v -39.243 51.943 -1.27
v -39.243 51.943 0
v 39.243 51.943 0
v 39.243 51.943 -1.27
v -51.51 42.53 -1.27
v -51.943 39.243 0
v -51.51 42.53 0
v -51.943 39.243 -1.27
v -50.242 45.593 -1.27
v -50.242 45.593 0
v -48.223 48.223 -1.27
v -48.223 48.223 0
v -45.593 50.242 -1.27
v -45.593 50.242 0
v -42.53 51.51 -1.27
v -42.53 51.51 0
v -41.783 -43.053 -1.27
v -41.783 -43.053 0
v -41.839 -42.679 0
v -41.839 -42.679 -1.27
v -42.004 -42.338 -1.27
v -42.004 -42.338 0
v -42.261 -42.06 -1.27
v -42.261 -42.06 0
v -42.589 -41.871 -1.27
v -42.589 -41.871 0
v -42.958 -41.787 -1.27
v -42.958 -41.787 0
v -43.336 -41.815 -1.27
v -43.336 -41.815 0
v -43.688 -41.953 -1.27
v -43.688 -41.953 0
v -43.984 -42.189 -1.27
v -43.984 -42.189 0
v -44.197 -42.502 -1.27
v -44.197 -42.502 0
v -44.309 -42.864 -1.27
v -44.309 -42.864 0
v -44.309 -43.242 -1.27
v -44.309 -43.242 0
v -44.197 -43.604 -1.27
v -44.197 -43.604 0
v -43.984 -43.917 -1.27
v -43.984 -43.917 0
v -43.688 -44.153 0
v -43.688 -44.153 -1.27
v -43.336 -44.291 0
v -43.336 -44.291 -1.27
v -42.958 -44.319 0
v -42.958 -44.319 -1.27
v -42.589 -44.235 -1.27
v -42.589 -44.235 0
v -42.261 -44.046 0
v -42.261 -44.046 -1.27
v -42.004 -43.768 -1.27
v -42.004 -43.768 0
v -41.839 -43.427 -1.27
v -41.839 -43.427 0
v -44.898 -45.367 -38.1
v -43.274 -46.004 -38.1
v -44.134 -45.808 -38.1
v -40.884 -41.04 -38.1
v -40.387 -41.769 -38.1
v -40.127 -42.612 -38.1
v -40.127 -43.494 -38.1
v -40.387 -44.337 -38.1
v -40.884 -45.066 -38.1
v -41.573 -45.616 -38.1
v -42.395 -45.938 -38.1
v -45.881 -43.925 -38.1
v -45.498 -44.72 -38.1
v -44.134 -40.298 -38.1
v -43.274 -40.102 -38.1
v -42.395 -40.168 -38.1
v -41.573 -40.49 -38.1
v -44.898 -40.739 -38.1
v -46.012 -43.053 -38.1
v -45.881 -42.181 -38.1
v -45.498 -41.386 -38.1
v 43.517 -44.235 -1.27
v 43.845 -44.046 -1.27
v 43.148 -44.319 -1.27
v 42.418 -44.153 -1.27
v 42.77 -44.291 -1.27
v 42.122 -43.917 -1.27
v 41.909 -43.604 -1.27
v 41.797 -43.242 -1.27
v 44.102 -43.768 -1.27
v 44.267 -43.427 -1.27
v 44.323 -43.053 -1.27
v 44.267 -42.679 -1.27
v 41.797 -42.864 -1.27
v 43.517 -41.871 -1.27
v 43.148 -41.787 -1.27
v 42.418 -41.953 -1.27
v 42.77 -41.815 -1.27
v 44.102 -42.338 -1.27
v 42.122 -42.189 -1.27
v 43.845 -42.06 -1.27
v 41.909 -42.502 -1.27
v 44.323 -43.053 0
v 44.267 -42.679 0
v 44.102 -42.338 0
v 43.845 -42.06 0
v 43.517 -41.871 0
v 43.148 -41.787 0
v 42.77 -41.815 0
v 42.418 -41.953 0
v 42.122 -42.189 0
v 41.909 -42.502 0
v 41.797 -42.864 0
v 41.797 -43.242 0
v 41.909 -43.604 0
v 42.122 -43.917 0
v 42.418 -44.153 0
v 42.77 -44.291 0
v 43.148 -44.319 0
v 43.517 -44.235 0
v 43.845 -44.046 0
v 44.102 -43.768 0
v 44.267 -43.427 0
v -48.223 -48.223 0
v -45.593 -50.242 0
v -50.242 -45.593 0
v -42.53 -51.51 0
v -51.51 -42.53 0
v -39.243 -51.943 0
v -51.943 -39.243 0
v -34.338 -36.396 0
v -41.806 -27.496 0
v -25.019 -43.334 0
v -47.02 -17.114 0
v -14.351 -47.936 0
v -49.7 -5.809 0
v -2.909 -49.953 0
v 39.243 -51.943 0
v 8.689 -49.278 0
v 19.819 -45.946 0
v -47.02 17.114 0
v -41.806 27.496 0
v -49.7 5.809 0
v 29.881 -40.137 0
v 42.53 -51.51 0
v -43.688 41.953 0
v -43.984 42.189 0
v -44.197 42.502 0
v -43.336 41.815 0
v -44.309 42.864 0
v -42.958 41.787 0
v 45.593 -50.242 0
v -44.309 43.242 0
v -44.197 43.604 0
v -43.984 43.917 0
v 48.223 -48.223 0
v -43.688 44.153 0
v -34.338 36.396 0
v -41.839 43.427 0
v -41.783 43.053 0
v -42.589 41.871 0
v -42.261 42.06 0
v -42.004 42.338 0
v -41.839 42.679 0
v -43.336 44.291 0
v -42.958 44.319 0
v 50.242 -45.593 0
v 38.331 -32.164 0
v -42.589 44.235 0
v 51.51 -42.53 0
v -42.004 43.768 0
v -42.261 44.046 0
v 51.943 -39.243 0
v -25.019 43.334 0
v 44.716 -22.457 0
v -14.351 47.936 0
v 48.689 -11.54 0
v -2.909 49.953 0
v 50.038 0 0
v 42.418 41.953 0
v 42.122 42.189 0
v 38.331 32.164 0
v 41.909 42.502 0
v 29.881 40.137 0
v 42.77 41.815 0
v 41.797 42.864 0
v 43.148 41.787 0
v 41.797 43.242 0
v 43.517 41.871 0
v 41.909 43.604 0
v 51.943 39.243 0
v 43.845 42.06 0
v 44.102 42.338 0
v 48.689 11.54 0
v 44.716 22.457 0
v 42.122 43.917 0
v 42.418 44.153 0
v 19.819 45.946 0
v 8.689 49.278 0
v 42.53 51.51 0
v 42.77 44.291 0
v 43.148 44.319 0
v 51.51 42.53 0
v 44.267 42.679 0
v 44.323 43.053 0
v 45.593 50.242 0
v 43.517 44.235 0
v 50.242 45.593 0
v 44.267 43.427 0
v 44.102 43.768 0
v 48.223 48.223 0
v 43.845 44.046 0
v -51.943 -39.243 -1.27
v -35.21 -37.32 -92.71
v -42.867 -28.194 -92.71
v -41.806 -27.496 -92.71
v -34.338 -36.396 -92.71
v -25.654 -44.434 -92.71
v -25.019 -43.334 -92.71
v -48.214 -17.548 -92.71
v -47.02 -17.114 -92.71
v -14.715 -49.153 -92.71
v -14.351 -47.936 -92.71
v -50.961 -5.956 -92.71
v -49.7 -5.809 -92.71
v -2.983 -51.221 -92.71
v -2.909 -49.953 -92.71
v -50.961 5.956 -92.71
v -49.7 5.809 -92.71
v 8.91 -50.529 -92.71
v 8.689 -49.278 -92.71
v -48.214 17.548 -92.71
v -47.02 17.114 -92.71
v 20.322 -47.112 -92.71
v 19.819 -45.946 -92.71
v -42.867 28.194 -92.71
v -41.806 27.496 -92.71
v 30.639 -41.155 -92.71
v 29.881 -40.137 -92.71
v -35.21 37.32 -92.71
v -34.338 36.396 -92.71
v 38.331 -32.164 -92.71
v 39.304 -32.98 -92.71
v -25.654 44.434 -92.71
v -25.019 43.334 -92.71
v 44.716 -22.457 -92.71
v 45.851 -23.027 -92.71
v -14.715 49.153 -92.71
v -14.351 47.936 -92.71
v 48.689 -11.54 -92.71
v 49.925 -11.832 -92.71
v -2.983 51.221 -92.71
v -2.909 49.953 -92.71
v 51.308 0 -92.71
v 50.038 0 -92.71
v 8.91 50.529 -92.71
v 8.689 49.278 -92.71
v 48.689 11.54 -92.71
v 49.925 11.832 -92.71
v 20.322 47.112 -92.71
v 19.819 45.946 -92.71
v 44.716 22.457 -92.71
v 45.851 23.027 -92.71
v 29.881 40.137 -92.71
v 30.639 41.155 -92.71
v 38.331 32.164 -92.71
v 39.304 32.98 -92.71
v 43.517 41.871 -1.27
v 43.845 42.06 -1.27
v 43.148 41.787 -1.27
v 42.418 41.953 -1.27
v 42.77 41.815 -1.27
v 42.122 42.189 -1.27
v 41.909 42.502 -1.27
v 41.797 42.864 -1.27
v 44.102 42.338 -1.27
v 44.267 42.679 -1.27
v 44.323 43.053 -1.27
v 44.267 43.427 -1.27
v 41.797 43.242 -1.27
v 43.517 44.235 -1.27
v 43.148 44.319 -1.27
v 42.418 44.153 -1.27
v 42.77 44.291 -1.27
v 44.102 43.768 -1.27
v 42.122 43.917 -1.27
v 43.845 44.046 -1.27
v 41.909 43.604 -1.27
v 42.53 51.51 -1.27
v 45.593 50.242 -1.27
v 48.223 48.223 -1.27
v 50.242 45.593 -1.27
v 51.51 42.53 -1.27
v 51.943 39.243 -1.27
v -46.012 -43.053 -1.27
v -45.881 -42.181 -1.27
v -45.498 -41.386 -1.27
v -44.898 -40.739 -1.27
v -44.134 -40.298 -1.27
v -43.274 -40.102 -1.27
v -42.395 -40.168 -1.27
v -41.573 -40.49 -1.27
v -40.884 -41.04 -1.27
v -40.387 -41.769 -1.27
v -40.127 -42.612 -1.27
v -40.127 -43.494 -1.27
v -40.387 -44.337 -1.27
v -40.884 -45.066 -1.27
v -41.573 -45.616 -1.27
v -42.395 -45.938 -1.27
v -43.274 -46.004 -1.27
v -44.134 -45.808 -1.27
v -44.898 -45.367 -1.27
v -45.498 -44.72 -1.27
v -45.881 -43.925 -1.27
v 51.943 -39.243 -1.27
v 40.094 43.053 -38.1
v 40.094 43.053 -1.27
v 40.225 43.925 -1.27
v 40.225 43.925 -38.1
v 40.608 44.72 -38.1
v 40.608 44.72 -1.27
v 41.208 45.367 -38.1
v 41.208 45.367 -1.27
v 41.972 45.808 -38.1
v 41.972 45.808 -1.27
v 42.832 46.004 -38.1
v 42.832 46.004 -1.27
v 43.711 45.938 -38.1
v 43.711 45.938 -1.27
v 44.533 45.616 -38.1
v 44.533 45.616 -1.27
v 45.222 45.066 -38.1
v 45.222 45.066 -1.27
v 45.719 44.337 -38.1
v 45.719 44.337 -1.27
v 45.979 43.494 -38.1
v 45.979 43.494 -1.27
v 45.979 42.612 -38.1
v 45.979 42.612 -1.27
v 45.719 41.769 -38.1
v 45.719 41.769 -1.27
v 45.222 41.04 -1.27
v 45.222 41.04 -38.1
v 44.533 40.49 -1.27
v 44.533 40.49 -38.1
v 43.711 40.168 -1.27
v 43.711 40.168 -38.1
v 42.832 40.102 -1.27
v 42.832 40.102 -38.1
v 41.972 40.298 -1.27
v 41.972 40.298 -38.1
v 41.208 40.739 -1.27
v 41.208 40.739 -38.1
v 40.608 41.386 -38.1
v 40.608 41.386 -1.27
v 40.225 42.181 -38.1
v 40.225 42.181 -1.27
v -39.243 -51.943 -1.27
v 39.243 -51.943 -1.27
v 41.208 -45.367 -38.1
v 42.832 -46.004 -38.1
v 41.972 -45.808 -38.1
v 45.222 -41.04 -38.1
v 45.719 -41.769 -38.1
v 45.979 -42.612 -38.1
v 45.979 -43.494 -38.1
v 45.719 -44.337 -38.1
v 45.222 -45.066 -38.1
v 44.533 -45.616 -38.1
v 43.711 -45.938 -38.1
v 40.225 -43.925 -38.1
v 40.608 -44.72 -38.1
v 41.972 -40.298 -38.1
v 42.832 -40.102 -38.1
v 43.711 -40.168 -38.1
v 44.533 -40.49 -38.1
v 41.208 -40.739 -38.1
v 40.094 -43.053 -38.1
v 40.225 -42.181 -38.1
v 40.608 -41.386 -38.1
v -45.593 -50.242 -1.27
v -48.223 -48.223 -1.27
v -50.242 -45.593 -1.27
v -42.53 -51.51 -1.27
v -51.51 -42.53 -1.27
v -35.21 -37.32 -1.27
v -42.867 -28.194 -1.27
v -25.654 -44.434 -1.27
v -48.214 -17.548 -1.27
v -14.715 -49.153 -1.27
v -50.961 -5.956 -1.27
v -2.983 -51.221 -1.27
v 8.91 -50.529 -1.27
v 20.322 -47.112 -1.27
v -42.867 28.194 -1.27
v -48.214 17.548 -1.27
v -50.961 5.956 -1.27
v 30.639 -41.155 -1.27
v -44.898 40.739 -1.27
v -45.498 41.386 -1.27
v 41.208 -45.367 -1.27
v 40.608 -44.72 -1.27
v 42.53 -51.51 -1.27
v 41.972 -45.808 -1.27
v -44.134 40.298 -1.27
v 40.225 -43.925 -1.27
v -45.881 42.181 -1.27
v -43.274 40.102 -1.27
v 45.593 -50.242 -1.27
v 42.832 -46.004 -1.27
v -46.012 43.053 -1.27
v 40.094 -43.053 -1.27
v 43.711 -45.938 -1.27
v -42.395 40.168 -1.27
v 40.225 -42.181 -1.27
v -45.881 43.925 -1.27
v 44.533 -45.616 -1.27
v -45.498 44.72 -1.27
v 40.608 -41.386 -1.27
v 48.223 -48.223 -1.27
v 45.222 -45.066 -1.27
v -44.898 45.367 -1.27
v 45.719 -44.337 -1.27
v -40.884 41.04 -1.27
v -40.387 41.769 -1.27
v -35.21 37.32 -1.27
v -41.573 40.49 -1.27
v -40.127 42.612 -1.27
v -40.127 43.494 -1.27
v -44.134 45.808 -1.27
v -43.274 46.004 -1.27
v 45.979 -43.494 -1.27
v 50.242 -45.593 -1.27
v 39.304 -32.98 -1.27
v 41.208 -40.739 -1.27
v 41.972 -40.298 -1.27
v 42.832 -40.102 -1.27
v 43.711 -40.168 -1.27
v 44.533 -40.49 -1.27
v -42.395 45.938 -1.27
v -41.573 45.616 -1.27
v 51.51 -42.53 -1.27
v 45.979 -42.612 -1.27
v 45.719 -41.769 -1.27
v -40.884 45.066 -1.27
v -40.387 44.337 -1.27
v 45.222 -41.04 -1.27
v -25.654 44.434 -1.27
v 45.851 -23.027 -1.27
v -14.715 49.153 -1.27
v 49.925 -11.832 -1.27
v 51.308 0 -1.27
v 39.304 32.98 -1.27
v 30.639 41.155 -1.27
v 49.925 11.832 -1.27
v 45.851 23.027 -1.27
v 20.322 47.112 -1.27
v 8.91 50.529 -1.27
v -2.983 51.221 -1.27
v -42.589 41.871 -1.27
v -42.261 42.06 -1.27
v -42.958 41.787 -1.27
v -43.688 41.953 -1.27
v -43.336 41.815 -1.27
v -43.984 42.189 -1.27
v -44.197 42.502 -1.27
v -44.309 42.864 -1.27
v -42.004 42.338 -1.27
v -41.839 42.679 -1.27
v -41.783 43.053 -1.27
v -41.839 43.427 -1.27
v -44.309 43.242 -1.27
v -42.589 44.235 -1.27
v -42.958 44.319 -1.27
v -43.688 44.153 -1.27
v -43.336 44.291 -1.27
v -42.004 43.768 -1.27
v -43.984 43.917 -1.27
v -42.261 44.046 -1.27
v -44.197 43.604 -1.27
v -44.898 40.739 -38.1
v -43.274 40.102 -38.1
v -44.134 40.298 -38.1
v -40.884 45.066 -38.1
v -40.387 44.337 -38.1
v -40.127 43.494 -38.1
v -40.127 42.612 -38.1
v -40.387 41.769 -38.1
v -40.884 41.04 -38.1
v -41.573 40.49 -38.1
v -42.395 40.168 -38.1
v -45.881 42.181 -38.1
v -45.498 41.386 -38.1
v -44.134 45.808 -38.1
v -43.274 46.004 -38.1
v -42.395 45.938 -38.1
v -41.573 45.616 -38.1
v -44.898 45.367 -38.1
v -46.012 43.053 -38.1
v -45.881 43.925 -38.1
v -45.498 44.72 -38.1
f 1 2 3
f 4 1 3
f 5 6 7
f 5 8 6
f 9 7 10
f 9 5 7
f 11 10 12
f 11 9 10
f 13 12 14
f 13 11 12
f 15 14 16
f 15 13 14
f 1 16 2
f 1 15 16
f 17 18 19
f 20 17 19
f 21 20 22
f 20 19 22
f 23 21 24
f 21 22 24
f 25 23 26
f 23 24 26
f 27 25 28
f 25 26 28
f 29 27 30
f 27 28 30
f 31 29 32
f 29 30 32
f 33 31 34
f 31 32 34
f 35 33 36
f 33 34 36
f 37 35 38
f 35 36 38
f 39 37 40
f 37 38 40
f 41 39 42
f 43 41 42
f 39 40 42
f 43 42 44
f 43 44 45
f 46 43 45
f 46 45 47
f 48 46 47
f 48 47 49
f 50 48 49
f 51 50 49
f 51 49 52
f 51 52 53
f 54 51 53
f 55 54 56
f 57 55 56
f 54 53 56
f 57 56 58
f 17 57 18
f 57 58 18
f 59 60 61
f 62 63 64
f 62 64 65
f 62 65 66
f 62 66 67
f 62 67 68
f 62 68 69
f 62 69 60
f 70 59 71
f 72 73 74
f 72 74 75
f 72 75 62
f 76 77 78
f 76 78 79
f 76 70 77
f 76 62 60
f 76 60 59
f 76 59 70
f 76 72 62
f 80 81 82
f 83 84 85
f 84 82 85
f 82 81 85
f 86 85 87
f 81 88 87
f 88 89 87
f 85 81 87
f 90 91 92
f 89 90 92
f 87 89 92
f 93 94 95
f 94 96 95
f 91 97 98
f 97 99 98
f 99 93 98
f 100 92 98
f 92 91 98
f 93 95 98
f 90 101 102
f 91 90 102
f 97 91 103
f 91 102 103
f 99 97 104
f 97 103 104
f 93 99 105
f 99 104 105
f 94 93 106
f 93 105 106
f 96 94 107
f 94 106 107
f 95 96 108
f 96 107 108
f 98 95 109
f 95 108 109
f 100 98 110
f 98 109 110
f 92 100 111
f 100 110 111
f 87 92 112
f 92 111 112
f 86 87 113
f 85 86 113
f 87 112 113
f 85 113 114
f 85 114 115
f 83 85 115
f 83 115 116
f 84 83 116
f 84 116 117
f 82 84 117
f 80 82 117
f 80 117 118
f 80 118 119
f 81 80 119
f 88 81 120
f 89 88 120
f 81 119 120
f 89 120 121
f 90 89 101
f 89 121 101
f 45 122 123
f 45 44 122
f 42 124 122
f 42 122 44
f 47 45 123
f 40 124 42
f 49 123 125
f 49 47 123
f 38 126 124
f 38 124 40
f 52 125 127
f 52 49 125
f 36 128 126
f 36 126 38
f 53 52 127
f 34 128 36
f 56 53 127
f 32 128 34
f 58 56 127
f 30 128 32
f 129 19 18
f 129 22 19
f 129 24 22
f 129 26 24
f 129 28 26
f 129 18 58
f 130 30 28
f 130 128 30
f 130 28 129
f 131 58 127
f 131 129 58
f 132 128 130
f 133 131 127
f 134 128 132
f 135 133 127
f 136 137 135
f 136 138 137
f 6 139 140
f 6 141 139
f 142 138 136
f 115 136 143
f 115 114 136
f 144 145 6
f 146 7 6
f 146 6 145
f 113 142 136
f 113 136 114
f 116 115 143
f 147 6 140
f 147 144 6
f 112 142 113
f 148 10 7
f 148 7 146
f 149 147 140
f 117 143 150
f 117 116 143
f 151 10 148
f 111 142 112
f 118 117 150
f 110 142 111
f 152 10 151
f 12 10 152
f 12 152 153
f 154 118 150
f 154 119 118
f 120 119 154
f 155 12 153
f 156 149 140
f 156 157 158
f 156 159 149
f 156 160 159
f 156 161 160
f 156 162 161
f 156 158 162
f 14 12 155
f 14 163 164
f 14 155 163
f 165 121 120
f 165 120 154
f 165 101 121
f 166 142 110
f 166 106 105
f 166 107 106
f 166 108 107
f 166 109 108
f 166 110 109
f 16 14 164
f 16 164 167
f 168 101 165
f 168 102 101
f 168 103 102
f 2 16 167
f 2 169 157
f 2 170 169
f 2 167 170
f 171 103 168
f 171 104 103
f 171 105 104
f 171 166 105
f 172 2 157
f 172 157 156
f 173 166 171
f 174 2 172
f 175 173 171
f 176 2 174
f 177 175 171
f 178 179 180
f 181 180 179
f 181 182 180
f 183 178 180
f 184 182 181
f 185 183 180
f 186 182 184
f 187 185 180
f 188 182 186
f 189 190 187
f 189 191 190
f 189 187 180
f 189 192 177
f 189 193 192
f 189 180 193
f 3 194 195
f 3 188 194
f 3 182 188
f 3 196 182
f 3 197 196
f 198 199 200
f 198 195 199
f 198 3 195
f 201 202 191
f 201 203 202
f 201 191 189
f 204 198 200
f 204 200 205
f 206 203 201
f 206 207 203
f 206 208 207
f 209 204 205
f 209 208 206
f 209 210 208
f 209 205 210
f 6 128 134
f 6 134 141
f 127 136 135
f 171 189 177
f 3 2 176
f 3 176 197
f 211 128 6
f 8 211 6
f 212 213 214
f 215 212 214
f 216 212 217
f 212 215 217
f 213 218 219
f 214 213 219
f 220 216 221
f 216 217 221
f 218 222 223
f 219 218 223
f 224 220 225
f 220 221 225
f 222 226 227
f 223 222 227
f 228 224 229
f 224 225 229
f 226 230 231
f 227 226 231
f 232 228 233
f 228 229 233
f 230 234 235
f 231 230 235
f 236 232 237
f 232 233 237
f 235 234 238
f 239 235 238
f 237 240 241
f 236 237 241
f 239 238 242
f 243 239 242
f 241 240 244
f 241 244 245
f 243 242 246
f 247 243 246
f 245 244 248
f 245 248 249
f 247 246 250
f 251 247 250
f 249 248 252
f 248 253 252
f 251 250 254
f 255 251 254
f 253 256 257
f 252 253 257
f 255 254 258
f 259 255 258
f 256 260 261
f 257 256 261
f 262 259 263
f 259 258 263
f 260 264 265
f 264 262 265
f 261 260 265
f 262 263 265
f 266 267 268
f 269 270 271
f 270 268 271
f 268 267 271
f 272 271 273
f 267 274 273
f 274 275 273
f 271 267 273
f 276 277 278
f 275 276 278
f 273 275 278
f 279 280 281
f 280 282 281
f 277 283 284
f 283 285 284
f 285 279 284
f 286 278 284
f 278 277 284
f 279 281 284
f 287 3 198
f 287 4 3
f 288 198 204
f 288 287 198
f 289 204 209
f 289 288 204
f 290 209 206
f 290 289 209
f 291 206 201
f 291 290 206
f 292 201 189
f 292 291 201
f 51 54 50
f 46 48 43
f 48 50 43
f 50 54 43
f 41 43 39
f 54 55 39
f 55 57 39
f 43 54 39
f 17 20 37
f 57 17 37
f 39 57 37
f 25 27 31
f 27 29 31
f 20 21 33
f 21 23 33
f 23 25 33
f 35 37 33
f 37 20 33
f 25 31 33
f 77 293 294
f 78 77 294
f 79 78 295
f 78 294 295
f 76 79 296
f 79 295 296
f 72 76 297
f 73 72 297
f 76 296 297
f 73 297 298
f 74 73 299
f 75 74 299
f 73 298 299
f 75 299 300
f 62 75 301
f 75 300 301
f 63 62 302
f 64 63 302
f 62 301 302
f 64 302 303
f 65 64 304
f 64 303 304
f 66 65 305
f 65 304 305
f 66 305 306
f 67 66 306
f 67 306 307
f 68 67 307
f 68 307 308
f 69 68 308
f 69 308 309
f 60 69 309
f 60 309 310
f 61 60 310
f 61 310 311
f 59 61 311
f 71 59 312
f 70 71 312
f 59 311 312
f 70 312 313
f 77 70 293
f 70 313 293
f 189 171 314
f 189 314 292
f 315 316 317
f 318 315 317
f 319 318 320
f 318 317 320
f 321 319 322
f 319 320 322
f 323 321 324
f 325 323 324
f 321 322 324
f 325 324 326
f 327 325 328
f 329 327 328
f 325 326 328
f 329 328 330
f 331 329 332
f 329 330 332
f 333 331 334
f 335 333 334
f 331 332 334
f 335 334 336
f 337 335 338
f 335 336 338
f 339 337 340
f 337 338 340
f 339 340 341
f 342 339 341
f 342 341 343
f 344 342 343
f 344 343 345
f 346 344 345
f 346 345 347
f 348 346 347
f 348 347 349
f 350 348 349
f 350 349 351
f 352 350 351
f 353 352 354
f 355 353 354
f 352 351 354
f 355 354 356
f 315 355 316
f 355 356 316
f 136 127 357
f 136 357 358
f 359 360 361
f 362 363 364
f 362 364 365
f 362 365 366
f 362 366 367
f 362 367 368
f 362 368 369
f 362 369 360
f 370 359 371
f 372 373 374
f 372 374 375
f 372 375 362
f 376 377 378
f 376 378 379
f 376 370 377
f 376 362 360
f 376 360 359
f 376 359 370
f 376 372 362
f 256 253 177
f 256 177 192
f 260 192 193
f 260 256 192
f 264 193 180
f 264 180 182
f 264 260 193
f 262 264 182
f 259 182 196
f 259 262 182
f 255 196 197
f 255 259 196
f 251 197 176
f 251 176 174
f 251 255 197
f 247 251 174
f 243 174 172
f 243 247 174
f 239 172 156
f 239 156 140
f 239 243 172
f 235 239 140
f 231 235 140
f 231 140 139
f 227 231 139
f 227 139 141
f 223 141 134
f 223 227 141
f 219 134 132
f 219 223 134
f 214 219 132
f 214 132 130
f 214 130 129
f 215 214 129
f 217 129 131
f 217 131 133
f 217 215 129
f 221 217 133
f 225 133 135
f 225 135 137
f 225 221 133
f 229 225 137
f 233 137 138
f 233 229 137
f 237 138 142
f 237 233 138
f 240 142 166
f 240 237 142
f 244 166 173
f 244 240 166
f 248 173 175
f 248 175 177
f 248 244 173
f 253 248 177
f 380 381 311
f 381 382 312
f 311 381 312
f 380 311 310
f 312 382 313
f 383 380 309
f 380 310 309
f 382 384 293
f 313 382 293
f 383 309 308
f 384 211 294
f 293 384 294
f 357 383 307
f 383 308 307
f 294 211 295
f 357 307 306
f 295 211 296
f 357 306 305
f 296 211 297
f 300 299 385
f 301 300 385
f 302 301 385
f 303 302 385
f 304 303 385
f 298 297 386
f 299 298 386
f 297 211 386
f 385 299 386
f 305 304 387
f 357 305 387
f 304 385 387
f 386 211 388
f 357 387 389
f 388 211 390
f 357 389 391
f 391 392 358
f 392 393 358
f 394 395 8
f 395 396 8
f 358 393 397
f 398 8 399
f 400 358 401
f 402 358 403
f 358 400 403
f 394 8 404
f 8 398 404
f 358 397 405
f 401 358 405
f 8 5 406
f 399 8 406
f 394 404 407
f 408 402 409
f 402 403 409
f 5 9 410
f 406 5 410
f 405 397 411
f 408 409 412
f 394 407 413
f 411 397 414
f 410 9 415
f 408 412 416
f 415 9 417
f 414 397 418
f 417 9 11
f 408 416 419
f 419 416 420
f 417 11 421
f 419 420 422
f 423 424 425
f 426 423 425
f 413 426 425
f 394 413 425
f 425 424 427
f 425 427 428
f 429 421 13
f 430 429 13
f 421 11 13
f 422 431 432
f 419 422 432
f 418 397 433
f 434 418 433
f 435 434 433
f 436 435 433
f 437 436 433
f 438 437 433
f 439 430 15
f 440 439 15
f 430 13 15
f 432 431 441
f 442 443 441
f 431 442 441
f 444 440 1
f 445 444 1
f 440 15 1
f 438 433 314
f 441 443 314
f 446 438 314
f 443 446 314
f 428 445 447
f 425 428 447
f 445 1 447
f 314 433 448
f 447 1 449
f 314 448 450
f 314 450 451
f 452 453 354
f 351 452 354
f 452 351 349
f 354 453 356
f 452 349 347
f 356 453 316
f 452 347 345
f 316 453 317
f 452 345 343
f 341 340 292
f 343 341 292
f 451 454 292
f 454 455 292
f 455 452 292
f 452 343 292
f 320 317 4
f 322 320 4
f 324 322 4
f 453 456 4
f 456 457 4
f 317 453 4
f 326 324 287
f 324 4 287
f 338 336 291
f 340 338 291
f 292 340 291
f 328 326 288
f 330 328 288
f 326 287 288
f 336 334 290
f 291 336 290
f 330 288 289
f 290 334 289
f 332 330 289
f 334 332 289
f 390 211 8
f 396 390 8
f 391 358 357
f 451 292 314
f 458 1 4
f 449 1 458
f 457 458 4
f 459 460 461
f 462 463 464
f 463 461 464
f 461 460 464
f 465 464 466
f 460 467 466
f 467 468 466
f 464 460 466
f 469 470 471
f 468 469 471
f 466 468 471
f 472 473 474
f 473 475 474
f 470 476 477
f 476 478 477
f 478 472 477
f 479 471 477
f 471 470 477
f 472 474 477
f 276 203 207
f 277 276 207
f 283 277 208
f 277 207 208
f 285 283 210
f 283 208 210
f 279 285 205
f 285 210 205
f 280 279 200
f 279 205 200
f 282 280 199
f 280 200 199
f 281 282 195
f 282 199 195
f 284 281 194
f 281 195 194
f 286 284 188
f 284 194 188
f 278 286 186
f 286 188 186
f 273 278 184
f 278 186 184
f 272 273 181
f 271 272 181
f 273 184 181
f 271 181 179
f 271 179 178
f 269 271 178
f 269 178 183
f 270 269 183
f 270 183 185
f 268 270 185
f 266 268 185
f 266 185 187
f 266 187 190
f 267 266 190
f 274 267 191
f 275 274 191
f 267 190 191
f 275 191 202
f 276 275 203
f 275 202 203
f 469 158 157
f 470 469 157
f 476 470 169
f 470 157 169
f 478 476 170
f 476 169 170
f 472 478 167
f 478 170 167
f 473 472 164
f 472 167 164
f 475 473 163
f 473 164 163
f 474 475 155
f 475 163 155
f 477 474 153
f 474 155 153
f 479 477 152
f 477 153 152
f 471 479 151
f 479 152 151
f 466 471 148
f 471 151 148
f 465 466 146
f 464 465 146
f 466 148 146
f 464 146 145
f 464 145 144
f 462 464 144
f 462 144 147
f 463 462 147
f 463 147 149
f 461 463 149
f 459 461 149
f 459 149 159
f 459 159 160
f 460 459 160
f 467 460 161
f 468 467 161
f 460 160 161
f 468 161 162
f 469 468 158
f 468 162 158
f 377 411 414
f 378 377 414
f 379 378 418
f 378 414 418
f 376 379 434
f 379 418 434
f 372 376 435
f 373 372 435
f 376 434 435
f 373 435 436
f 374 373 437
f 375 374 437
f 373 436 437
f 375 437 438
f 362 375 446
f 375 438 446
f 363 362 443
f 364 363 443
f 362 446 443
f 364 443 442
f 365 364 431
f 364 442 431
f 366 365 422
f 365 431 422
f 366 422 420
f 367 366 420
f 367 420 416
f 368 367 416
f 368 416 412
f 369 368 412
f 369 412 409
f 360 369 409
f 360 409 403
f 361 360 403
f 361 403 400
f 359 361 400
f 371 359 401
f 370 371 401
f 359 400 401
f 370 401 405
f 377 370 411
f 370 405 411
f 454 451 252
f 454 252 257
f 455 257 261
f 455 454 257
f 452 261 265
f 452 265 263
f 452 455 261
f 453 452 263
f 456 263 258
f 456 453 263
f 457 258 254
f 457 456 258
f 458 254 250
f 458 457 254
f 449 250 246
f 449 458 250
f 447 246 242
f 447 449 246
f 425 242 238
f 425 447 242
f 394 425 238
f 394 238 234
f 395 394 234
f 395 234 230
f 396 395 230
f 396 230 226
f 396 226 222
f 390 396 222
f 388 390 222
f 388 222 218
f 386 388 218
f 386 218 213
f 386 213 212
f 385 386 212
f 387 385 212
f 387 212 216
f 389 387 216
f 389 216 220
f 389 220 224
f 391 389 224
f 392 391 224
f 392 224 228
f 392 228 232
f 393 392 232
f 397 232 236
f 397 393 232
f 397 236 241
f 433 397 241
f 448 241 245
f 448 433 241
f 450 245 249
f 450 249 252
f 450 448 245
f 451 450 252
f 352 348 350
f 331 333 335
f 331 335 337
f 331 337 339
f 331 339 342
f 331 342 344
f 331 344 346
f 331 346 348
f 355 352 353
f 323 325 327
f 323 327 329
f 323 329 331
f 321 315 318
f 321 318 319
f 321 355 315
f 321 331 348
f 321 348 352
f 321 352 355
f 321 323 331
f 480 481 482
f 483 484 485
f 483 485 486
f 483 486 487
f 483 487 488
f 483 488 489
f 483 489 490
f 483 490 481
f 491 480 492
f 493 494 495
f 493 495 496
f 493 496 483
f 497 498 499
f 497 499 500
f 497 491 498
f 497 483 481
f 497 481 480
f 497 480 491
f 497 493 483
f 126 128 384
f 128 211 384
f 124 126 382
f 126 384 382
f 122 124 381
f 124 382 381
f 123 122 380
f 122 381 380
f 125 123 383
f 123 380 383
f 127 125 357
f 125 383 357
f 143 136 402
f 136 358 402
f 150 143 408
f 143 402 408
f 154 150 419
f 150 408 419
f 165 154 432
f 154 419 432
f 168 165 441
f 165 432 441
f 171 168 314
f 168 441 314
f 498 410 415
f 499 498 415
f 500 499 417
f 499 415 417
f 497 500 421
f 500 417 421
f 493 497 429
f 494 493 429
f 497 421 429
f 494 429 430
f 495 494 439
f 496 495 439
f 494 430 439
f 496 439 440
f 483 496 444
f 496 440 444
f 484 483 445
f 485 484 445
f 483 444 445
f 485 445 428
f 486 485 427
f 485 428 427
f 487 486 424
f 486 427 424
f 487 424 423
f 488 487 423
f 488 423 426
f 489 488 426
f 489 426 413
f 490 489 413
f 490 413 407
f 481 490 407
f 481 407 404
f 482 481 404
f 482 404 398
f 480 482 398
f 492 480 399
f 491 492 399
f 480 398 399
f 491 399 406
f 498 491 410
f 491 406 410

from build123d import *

# Parameters (mm, degrees)
SKETCH1_R           = 51.308
BOSS_EXTRUDE1_DEPTH = 92.71
SKETCH2_W           = 103.886
SKETCH2_H           = 103.886
SKETCH2_R           = 1.27
BOSS_EXTRUDE2_DEPTH = 1.27
SHELL1_START        = -92.71
SHELL1_OUTLINE_R    = 50.038
SHELL1_DEPTH        = 92.71
FILLET1_R           = 12.7
SKETCH3_R           = 2.9591
BOSS_EXTRUDE3_DEPTH = 36.83


# Read off the part's stored shape, not the designer's step: Shell1
with BuildPart() as part:
    # Sketch1 → Boss-Extrude1 (new body)
    with BuildSketch(Plane.XY):
        Circle(SKETCH1_R)
    extrude(amount=-BOSS_EXTRUDE1_DEPTH)

    # Sketch2 → Boss-Extrude2 (add)
    with BuildSketch(Plane.XY):
        Rectangle(SKETCH2_W, SKETCH2_H)
        with Locations((43.053, 43.053)):
            Circle(SKETCH2_R, mode=Mode.SUBTRACT)
        with Locations((-43.053, 43.053)):
            Circle(SKETCH2_R, mode=Mode.SUBTRACT)
        with Locations((43.053, -43.053)):
            Circle(SKETCH2_R, mode=Mode.SUBTRACT)
        with Locations((-43.053, -43.053)):
            Circle(SKETCH2_R, mode=Mode.SUBTRACT)
    extrude(amount=-BOSS_EXTRUDE2_DEPTH)

    # Shell1 outline → Shell1 (cut)
    with BuildSketch(Plane.XY.offset(SHELL1_START)):
        Circle(SHELL1_OUTLINE_R)
    extrude(amount=SHELL1_DEPTH, mode=Mode.SUBTRACT)

    # Fillet1
    fillet1_edges = [part.edges().sort_by_distance(p)[0] for p in [
        (51.943, 51.943, -0.635),
        (51.943, -51.943, -0.635),
        (-51.943, -51.943, -0.635),
        (-51.943, 51.943, -0.635),
    ]]
    fillet(fillet1_edges, radius=FILLET1_R)

    # Sketch3 → Boss-Extrude3 (add)
    with BuildSketch(Plane(origin=(0, 0, -1.27), x_dir=(-1, 0, 0), z_dir=(0, 0, -1))):
        with Locations((-43.053, 43.053)):
            Circle(SKETCH3_R)
        with Locations((43.053, 43.053)):
            Circle(SKETCH3_R)
        with Locations((43.053, -43.053)):
            Circle(SKETCH3_R)
        with Locations((-43.053, -43.053)):
            Circle(SKETCH3_R)
    extrude(amount=BOSS_EXTRUDE3_DEPTH)


solid = part.part
